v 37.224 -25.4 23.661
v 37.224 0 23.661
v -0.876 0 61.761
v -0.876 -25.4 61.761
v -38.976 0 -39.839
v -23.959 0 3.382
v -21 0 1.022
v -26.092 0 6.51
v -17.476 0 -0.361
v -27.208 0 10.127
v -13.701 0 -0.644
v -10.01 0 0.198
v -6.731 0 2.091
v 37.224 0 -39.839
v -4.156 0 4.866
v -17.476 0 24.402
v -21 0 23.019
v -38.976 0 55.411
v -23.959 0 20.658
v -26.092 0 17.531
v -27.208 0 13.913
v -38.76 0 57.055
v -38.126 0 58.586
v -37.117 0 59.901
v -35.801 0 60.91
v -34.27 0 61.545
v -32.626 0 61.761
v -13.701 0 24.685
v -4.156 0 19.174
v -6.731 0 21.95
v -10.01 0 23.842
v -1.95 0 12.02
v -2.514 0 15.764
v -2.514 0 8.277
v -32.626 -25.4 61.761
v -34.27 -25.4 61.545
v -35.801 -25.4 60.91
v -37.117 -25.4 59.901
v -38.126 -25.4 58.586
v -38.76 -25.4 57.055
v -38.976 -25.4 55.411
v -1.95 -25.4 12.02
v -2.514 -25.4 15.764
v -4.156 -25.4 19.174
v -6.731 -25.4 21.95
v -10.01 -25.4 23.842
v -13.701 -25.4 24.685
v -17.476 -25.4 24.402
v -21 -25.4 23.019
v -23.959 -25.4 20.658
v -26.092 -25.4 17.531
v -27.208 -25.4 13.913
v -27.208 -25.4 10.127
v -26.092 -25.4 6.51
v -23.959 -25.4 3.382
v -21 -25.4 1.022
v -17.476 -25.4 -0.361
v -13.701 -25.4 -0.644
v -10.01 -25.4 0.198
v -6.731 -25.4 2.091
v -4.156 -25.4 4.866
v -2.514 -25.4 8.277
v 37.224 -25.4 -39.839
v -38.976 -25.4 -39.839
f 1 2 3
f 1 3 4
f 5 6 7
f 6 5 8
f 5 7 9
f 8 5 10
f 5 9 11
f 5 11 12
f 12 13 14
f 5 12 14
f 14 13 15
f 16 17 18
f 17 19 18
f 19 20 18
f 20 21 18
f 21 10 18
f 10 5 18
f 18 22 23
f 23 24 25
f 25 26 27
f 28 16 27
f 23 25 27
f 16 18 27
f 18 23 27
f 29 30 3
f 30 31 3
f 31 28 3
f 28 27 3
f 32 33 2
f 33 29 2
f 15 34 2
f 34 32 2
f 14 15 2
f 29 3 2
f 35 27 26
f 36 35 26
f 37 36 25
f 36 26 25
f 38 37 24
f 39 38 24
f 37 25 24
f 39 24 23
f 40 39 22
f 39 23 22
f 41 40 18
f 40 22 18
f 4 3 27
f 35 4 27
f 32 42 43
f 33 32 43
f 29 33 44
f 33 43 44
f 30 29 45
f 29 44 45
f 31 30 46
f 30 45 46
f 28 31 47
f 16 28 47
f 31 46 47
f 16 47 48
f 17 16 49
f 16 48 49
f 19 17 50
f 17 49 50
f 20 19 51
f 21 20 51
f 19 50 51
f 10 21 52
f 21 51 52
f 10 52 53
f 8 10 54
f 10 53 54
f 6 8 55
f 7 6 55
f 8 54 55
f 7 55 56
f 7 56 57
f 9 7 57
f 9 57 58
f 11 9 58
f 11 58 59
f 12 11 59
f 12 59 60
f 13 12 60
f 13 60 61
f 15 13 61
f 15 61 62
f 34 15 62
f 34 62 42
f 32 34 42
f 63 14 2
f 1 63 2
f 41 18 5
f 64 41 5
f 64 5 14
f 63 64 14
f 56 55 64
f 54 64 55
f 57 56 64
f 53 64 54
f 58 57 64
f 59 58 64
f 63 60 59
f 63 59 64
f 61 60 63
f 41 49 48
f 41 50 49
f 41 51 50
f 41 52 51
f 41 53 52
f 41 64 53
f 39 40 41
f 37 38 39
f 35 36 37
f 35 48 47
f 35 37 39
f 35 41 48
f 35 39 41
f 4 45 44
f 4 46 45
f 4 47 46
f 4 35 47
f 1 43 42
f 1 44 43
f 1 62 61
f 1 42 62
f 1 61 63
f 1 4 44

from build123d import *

# Parameters (mm, degrees)
F1_DEPTH = 25.4
F2_SIZE  = 38.1
F3_R     = 12.7
F4_DEPTH = 86.614


with BuildPart() as f1:
    # F0 (on Front) → F1 (new body)
    with BuildSketch(Plane.XZ):
        with BuildLine():
            Line((37.223521, 61.761211), (-32.626479, 61.761211))
            ThreePointArc((-32.626479, 61.761211), (-37.116607, 59.901339), (-38.976479, 55.411211))
            Line((-38.976479, 55.411211), (-38.976479, -39.838789))
            Line((-38.976479, -39.838789), (37.223521, -39.838789))
            Line((37.223521, -39.838789), (37.223521, 61.761211))
        make_face()
    extrude(amount=F1_DEPTH)

    # F2
    f2_edges = [f1.edges().sort_by_distance(p)[0] for p in [
        (37.223521, -12.7, 61.761211),
    ]]
    chamfer(f2_edges, length=F2_SIZE)

    # F3 (on face) → F4 (cut)
    with BuildSketch(Plane.XZ.offset(25.4)):
        with Locations((-14.649719, 12.020282)):
            Circle(F3_R)
    extrude(amount=-F4_DEPTH, mode=Mode.SUBTRACT)


solid = f1.part
